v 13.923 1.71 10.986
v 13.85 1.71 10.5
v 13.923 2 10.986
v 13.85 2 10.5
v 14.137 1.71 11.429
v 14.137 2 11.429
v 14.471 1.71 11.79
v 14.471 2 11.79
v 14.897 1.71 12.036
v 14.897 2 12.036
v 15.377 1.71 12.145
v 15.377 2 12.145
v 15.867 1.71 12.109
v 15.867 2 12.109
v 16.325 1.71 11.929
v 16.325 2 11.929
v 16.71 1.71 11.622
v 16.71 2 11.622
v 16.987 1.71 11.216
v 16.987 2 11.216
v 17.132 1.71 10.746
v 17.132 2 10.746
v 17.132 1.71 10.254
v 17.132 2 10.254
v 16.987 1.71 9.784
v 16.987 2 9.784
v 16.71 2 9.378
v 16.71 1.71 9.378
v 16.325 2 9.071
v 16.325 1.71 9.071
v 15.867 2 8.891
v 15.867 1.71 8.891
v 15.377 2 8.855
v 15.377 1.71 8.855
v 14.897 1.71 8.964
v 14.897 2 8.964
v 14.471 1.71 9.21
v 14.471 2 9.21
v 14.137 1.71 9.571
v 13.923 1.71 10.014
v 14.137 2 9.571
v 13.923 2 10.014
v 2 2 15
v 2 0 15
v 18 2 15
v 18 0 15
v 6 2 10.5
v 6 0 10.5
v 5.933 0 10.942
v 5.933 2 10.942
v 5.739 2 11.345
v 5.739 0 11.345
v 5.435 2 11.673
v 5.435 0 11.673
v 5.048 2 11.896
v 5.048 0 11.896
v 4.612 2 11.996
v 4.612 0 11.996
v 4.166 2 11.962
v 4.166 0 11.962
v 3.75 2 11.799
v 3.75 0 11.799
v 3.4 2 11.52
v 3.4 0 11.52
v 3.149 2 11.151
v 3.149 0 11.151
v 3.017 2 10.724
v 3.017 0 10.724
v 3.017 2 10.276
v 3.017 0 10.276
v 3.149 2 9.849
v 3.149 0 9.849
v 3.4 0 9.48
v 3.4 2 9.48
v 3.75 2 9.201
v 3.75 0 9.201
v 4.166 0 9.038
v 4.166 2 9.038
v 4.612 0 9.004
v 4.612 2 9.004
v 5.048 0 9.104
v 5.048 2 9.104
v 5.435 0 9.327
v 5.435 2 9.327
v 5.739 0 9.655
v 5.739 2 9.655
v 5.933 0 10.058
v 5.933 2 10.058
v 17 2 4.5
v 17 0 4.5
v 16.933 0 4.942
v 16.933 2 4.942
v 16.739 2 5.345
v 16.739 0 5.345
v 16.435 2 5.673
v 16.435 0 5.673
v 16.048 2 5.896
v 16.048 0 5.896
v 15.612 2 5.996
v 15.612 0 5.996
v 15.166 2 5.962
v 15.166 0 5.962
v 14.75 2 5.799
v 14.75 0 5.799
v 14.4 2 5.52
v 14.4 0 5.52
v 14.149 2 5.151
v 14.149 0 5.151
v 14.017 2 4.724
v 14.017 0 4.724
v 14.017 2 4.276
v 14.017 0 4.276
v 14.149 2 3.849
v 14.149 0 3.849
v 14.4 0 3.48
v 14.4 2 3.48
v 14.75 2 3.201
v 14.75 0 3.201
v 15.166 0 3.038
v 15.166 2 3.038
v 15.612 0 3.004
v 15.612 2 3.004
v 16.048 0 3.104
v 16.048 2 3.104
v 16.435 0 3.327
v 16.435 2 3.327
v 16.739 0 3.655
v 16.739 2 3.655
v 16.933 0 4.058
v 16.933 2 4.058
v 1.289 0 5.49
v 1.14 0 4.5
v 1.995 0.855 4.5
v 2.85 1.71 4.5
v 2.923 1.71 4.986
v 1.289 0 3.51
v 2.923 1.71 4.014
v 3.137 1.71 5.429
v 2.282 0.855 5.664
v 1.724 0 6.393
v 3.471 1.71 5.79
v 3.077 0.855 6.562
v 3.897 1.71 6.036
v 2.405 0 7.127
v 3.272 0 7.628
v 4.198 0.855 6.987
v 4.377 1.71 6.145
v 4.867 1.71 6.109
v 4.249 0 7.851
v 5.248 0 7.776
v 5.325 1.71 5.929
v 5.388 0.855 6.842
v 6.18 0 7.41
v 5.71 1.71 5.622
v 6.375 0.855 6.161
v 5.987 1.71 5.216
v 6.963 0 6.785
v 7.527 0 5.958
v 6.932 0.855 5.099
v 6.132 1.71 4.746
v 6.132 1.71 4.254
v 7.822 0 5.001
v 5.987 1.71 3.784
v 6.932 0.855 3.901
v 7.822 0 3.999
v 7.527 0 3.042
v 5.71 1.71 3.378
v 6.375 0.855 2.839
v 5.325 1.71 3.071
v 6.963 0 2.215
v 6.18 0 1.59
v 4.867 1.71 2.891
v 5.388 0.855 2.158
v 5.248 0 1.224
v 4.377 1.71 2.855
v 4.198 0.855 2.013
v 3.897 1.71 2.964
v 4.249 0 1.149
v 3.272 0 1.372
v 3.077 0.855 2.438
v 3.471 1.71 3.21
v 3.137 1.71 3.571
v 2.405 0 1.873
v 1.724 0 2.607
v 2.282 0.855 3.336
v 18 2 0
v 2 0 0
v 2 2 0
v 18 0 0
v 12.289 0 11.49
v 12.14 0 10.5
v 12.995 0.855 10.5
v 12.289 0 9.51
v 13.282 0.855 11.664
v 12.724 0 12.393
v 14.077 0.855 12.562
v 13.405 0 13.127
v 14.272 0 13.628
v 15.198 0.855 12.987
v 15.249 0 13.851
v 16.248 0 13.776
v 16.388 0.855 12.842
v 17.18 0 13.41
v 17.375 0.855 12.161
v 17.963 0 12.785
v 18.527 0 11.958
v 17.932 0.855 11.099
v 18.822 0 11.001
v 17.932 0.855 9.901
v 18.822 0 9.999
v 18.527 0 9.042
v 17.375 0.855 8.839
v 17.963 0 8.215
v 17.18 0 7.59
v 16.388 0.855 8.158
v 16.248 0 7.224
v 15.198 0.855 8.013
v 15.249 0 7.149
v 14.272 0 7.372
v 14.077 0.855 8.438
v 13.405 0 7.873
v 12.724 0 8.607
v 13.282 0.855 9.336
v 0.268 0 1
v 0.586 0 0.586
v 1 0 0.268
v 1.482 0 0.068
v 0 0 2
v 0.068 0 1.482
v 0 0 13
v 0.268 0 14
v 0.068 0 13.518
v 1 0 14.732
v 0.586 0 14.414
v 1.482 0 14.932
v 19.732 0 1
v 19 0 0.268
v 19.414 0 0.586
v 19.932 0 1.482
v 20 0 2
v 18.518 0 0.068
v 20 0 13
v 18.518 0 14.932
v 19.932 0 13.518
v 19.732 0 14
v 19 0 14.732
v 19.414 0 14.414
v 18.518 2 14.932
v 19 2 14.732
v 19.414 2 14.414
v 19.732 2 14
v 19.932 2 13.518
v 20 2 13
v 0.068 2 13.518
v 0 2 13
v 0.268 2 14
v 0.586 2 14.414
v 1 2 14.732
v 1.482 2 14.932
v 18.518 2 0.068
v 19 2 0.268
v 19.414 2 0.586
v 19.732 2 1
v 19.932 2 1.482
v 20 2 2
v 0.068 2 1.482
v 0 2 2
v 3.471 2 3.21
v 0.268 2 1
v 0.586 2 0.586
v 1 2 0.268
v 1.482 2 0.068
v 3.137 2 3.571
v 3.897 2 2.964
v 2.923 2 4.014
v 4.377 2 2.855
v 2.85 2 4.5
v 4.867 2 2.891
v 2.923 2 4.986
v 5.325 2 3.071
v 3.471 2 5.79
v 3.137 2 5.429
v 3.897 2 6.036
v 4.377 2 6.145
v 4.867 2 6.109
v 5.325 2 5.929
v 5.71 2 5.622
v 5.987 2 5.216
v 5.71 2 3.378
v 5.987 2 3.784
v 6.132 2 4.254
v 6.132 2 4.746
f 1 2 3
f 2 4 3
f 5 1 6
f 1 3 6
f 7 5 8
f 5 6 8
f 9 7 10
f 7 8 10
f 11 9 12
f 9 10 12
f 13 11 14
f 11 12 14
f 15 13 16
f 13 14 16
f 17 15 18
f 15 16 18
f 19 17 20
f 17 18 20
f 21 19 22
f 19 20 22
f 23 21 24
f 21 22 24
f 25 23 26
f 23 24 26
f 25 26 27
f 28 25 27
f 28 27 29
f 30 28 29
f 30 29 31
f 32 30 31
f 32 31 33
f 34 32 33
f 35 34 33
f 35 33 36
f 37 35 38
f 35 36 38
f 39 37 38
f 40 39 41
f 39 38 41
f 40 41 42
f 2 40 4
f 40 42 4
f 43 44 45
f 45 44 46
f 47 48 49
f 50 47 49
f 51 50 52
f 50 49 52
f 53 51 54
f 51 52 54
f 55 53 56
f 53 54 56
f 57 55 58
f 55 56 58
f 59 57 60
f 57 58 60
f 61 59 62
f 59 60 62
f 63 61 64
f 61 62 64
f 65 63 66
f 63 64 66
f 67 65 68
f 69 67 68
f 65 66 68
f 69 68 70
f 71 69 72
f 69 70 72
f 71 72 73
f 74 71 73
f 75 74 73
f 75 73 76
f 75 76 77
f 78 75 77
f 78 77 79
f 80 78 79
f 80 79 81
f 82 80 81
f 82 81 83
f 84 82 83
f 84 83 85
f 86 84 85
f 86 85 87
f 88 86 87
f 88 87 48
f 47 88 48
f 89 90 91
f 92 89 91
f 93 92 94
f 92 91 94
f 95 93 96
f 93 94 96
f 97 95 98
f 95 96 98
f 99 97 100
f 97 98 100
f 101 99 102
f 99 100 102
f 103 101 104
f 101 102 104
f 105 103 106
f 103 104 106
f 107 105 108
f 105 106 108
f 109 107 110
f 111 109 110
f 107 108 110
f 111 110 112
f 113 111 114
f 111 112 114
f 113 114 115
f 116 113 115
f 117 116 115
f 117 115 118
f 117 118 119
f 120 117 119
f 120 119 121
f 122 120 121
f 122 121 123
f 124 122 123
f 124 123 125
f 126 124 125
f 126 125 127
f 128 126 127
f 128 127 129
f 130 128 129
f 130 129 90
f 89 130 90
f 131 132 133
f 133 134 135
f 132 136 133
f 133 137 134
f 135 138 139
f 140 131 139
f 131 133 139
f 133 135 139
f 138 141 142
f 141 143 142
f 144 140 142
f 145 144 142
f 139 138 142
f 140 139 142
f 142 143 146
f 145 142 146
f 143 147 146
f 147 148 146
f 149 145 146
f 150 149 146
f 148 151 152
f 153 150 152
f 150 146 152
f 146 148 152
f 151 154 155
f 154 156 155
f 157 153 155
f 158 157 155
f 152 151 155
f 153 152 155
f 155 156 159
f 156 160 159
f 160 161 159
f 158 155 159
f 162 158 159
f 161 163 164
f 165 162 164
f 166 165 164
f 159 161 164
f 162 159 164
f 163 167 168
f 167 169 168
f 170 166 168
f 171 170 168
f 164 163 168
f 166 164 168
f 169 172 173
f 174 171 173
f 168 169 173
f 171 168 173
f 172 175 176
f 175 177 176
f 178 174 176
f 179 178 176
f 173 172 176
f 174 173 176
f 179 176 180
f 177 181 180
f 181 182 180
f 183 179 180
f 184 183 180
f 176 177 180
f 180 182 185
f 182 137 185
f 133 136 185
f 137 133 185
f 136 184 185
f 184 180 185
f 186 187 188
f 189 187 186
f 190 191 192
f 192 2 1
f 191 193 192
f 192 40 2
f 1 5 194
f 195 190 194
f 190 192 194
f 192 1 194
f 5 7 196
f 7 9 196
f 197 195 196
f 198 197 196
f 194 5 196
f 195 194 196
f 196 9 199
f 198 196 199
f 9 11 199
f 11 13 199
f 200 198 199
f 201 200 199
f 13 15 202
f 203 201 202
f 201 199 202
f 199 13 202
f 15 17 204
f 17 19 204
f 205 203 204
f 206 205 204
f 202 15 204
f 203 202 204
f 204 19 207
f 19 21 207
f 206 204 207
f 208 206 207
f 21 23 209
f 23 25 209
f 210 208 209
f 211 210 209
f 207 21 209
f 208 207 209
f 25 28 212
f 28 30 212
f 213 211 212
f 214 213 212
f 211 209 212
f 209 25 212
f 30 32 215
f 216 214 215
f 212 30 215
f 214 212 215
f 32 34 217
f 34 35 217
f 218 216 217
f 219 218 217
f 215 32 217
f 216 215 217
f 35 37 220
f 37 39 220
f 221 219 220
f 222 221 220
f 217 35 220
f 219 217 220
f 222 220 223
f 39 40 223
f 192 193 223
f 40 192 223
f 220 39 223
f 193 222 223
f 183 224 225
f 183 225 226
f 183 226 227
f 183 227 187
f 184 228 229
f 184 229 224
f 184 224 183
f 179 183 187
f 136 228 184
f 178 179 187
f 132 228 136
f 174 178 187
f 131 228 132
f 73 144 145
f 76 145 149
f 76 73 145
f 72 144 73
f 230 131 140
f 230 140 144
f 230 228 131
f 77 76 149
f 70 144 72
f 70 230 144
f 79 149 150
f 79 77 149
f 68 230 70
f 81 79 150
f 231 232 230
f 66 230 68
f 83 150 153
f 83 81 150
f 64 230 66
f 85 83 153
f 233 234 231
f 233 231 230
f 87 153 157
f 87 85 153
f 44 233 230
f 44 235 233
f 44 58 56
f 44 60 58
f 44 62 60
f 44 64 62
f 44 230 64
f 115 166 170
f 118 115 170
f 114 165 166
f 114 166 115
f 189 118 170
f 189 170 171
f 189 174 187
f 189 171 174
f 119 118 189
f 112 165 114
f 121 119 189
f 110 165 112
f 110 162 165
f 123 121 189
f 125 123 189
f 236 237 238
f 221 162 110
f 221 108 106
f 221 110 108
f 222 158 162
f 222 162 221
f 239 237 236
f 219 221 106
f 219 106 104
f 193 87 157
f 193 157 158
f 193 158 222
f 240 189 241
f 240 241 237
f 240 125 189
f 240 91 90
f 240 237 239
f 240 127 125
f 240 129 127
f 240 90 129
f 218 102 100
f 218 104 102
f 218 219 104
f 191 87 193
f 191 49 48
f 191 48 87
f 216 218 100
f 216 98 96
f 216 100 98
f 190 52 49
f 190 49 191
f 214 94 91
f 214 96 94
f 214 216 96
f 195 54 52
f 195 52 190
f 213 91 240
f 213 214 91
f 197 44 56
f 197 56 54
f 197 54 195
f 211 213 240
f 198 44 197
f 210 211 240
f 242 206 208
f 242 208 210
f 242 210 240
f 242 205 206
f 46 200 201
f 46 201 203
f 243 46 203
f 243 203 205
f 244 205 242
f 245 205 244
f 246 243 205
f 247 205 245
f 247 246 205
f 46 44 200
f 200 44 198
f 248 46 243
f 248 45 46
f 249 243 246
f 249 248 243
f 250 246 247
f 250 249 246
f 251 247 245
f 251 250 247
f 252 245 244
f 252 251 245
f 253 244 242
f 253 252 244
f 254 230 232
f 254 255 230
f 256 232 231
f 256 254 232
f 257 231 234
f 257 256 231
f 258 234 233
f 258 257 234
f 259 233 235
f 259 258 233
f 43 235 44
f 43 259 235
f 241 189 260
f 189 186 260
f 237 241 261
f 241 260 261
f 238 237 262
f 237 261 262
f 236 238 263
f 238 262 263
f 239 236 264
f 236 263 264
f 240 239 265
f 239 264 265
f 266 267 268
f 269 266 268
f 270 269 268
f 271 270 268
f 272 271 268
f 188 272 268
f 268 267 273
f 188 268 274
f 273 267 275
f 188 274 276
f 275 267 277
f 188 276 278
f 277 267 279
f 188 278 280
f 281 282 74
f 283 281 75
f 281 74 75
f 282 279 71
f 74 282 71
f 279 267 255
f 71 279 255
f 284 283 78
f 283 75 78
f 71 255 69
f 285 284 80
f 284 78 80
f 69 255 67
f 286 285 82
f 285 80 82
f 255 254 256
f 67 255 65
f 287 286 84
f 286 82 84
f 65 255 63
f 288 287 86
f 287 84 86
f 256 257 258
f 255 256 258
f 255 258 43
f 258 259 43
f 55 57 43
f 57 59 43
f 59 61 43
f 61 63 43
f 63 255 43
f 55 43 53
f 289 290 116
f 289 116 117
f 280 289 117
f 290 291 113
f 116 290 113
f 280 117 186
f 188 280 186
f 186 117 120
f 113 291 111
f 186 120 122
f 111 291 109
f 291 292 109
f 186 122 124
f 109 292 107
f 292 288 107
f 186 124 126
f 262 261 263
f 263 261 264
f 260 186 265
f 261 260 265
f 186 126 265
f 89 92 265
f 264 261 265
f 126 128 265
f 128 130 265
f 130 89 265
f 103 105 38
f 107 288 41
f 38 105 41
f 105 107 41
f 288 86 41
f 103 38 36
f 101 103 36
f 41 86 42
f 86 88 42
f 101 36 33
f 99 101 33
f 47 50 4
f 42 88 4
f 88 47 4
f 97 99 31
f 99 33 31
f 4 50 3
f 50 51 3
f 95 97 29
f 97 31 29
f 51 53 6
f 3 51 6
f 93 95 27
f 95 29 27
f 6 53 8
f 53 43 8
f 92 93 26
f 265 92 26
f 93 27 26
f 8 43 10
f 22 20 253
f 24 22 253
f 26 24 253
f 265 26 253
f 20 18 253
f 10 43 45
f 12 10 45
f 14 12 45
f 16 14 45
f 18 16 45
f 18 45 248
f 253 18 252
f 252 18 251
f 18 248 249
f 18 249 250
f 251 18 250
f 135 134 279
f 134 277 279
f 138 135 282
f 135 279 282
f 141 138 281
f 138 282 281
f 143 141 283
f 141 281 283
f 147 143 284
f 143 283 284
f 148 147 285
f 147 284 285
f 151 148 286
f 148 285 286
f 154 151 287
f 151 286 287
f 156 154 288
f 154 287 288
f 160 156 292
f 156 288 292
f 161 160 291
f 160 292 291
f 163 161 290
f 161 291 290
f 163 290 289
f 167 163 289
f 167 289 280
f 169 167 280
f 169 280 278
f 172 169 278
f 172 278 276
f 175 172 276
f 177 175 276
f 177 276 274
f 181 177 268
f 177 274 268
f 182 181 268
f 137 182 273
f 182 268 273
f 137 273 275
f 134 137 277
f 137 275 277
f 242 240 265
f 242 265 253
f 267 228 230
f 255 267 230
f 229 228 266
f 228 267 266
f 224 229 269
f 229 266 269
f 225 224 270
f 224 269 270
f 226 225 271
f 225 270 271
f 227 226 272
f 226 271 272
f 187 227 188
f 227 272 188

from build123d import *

# Parameters (mm, degrees)
F0_W           = 20
F0_H           = 15
F1_DEPTH       = 2
F3_D           = 3.3
F3_CSINK_D     = 6.72
F3_CSINK_ANGLE = 90
F4_R           = 1.5
F5_DEPTH       = 2.001
F6_R           = 2


with BuildPart() as f1:
    # F0 (on Front) → F1 (new body)
    with BuildSketch(Plane.XZ):
        with Locations((10, 7.5)):
            Rectangle(F0_W, F0_H)
    extrude(amount=-F1_DEPTH)

    # F3 (through all)
    with Locations(Plane.XZ):
        with Locations((15.5, 10.5), (4.5, 4.5)):
            CounterSinkHole(F3_D / 2, F3_CSINK_D / 2, counter_sink_angle=F3_CSINK_ANGLE)

    # F4 (on face) → F5 (cut, through all)
    with BuildSketch(Plane.XZ):
        with Locations((15.5, 4.5)):
            Circle(F4_R)
        with Locations((4.5, 10.5)):
            Circle(F4_R)
    extrude(amount=-F5_DEPTH, mode=Mode.SUBTRACT)

    # F6
    f6_edges = [f1.edges().sort_by_distance(p)[0] for p in [
        (20, 1, 15),
        (0, 1, 15),
        (20, 1, 0),
        (0, 1, 0),
    ]]
    fillet(f6_edges, radius=F6_R)


solid = f1.part
